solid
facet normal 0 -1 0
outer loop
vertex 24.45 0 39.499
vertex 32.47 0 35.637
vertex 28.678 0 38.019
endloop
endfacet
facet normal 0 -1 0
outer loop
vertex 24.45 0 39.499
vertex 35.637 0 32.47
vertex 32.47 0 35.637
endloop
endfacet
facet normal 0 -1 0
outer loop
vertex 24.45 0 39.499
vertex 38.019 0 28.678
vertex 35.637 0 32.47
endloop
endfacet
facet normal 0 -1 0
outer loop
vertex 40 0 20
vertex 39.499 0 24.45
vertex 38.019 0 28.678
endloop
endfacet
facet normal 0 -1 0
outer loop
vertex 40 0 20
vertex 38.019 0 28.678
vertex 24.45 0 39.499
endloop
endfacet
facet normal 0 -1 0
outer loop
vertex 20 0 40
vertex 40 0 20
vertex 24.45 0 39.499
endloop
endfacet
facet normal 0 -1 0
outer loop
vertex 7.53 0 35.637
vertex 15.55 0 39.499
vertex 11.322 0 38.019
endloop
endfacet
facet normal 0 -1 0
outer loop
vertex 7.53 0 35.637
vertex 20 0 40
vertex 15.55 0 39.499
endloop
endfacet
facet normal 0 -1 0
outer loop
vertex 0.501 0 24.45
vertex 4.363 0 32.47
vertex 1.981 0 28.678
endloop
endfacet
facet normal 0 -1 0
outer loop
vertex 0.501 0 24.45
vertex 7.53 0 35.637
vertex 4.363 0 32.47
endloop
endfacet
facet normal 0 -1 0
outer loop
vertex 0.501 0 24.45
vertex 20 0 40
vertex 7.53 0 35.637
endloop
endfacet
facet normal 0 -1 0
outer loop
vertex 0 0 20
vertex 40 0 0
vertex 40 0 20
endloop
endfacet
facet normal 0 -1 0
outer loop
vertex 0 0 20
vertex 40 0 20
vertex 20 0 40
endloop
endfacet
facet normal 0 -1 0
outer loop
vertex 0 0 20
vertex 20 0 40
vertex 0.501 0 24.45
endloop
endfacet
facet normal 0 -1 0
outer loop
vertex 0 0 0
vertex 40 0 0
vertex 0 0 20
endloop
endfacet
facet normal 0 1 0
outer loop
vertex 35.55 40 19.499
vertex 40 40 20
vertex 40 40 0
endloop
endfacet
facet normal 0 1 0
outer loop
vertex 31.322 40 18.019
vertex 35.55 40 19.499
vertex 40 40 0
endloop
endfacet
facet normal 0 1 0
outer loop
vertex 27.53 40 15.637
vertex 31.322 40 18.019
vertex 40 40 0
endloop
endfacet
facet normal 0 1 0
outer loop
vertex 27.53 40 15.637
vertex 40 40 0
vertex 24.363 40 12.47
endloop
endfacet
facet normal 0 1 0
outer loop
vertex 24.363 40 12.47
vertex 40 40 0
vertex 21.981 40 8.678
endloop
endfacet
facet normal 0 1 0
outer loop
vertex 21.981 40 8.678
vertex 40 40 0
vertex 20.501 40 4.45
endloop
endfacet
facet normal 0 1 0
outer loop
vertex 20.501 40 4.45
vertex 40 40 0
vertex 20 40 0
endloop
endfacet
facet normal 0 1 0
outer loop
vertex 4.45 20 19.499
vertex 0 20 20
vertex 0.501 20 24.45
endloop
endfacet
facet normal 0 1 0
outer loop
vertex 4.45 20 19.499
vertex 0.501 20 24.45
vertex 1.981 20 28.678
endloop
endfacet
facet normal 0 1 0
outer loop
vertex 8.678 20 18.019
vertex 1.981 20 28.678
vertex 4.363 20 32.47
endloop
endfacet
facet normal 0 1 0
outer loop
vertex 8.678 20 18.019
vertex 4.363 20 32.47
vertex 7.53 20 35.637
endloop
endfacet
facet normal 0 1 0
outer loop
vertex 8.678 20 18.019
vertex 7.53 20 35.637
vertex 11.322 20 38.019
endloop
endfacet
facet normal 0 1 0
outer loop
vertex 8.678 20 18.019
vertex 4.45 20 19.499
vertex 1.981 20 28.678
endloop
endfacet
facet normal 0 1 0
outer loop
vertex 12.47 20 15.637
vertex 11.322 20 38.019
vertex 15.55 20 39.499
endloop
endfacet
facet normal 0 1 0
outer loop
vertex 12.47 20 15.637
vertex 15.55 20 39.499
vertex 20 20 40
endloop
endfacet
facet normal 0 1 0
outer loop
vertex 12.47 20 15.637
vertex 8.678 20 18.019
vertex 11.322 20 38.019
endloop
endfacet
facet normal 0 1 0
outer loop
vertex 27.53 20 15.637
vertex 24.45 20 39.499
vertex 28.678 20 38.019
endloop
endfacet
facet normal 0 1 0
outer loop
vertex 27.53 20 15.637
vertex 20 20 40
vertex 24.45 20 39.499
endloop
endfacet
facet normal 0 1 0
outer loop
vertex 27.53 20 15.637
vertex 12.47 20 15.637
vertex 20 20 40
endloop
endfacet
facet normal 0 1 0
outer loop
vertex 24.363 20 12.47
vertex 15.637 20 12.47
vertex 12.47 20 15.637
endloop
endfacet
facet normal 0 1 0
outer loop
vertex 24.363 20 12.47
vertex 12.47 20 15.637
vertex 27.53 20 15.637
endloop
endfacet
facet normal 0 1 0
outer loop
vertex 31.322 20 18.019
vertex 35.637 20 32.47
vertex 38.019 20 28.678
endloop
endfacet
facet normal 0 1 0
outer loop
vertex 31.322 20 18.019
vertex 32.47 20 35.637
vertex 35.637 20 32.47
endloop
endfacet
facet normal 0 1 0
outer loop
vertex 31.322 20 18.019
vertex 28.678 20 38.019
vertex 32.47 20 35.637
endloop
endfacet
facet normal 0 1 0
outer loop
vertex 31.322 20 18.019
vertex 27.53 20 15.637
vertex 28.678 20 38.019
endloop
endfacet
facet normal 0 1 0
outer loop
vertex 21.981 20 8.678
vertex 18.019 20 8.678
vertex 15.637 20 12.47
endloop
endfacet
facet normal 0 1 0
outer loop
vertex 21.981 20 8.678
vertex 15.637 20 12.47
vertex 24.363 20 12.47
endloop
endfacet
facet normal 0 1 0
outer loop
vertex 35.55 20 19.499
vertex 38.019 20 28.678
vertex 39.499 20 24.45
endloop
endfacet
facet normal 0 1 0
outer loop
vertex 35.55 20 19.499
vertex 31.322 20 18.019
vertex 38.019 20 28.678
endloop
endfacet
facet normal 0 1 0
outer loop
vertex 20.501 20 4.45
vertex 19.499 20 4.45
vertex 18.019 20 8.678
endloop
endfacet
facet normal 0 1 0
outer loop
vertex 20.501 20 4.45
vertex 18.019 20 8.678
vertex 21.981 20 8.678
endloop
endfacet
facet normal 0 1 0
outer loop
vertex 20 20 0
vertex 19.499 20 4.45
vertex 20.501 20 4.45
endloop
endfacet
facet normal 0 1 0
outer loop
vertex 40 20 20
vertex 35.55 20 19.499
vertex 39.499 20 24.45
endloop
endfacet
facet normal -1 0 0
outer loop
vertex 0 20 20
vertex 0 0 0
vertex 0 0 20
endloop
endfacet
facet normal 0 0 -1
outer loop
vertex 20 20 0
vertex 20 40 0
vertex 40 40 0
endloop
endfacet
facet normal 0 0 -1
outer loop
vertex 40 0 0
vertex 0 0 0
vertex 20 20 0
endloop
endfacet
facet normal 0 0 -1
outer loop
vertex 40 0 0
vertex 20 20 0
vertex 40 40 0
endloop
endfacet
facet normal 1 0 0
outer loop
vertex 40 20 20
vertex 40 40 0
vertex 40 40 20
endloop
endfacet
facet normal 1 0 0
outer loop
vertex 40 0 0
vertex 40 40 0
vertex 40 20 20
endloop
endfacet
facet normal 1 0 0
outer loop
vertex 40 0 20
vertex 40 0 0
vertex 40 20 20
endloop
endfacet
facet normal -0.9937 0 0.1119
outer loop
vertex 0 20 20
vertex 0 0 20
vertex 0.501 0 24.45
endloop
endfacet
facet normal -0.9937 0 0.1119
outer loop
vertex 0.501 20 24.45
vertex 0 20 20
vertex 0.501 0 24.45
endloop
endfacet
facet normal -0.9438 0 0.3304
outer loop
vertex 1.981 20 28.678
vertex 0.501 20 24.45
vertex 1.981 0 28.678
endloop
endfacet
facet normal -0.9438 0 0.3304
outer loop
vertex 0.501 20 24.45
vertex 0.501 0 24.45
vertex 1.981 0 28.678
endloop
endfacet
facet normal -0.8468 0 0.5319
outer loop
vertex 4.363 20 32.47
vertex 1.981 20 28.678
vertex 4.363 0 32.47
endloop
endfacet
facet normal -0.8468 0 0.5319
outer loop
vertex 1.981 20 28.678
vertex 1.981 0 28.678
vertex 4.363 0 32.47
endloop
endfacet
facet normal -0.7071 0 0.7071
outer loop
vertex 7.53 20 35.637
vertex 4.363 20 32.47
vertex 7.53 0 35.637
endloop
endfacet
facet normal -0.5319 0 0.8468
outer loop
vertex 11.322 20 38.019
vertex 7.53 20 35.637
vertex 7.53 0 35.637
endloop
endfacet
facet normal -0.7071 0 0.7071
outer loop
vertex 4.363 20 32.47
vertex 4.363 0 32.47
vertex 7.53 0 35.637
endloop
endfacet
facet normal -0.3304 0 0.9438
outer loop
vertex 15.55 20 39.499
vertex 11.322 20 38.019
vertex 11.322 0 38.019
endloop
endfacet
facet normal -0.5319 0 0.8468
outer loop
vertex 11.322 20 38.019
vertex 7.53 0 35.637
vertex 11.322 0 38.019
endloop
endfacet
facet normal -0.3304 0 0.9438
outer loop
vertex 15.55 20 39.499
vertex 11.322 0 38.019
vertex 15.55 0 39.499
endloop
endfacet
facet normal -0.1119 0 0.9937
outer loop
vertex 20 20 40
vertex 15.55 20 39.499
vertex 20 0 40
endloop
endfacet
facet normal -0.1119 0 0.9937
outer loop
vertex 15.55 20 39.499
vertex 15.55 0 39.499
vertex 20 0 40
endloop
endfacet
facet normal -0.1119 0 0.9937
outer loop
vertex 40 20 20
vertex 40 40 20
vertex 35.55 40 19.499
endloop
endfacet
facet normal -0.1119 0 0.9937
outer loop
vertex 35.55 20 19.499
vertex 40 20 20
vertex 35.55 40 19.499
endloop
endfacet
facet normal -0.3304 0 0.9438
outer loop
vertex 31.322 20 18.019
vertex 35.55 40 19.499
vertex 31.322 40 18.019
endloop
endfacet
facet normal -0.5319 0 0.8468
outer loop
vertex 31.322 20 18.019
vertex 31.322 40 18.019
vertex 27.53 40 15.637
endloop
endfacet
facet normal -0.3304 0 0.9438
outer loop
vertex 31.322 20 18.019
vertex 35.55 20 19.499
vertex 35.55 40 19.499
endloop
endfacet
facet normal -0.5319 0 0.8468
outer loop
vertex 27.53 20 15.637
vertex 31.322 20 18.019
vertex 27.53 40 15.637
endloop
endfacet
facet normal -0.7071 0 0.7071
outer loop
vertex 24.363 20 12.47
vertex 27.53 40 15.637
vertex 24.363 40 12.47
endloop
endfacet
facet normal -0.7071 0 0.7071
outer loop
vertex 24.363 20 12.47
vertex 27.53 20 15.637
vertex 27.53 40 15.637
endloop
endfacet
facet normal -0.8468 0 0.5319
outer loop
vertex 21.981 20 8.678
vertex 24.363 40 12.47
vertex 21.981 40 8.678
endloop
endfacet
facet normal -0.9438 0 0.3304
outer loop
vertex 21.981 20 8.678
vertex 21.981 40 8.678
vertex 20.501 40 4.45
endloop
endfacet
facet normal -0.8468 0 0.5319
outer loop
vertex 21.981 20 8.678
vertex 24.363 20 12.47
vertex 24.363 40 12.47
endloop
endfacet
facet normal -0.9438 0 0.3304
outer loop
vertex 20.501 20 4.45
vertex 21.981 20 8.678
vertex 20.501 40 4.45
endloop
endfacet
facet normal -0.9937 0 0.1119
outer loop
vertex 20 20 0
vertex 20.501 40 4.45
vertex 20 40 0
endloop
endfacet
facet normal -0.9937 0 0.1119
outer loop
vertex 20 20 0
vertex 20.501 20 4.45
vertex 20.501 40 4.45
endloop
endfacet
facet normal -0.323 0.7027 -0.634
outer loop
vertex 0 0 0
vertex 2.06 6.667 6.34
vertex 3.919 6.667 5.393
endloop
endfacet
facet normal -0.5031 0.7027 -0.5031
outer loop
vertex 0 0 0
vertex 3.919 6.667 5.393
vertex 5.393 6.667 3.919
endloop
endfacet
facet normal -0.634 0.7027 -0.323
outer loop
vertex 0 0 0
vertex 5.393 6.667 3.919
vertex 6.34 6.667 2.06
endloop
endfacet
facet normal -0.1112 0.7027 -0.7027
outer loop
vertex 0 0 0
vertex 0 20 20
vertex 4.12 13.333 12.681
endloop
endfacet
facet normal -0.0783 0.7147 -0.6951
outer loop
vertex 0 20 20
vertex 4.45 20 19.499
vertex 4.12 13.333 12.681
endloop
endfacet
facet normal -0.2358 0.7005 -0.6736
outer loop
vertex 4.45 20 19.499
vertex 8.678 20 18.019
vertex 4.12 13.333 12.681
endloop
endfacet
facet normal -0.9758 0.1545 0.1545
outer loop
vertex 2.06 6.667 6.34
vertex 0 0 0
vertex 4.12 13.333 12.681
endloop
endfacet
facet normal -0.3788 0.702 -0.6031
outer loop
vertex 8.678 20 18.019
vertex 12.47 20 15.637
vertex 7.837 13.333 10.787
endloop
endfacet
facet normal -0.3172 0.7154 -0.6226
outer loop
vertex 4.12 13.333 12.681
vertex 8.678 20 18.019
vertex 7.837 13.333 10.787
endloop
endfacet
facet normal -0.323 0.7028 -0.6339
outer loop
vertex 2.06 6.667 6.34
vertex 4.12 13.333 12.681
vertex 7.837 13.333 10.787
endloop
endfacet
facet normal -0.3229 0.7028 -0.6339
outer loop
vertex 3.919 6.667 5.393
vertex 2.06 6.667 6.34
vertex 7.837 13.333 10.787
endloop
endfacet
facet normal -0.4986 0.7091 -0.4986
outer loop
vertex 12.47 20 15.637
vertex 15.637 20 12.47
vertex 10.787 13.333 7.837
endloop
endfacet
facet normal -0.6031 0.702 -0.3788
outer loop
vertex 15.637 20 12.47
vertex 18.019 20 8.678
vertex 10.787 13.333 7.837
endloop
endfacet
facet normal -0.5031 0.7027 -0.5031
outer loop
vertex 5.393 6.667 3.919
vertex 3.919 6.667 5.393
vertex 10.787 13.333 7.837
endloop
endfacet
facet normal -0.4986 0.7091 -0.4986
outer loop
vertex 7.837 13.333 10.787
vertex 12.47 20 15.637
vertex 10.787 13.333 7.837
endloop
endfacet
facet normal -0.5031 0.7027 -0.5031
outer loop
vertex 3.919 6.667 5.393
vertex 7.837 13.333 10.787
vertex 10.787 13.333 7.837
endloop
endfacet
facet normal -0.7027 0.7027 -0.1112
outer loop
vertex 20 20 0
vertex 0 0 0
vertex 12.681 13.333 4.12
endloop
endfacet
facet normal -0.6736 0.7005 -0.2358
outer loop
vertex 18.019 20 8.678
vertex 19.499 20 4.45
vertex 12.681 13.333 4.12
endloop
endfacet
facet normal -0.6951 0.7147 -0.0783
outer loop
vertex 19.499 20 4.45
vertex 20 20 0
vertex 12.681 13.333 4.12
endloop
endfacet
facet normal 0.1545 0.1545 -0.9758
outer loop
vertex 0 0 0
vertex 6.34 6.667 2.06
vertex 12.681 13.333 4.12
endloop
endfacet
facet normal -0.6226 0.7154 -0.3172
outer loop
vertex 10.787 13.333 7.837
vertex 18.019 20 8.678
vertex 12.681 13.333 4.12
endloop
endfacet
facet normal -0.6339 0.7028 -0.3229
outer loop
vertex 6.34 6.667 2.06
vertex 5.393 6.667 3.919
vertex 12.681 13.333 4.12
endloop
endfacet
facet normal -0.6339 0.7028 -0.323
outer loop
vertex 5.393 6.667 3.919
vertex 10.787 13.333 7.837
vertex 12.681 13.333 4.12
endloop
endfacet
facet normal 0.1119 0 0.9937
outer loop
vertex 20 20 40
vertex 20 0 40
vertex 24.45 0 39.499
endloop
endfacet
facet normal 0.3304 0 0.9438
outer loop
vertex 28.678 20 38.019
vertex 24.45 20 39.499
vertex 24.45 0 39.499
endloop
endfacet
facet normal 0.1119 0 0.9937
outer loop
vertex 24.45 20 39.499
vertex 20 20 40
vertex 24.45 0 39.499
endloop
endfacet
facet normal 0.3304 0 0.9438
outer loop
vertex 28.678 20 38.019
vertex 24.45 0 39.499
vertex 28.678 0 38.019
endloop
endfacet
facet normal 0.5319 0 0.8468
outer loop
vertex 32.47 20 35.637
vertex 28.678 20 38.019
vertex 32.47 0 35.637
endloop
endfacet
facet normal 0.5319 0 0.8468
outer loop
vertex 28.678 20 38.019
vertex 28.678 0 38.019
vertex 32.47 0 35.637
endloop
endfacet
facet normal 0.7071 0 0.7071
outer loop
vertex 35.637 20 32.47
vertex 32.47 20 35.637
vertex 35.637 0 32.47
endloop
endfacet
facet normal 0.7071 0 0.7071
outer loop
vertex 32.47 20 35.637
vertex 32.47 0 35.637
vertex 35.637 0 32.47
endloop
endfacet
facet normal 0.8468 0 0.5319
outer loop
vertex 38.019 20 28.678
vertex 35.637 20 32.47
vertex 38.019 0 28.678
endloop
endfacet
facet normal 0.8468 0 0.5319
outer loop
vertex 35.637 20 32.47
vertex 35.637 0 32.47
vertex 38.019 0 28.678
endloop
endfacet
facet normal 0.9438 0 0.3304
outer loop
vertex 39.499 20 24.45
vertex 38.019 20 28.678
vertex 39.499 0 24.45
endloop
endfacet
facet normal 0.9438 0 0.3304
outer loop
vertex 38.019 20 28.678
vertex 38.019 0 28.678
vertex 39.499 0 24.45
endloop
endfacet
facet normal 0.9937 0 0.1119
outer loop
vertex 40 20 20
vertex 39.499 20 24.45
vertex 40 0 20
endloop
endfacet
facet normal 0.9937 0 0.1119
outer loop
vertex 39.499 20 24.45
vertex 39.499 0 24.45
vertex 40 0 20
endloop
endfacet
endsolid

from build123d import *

# Parameters (mm, degrees)
BOSS_EXTRUDE1_DEPTH = 40
CUT_EXTRUDE1_DEPTH  = 40
SKETCH3_W           = 20
SKETCH3_H           = 20
CUT_EXTRUDE2_DEPTH  = 20
BOSS_EXTRUDE4_DEPTH = 20
CUT_EXTRUDE3_DEPTH  = 20


with BuildPart() as part:
    # Sketch1 → Boss-Extrude1 (new body)
    with BuildSketch(Plane.XY):
        Polygon((0, 0), (0, 40), (20, 40), (20, 20), (40, 20), (40, 0), align=None)
    extrude(amount=BOSS_EXTRUDE1_DEPTH)

    # Sketch2 → Cut-Extrude1 (cut)
    with BuildSketch(Plane(origin=(0, 0, 0), x_dir=(-1, 0, 0), z_dir=(0, -1, 0))):
        with BuildLine():
            Line((0, -40), (0, -20))
            ThreePointArc((0, -20), (-5.857864376, -34.142135624), (-20, -40))
            Line((-20, -40), (0, -40))
        make_face()
        with BuildLine():
            Line((-40, -40), (-20, -40))
            ThreePointArc((-20, -40), (-34.142135624, -34.142135624), (-40, -20))
            Line((-40, -20), (-40, -40))
        make_face()
    extrude(amount=-CUT_EXTRUDE1_DEPTH, mode=Mode.SUBTRACT)

    # Sketch3 → Cut-Extrude2 (cut)
    with BuildSketch(Plane(origin=(0, 20, 0), x_dir=(1, 0, 0), z_dir=(0, 1, 0))):
        with Locations((10, -10)):
            Rectangle(SKETCH3_W, SKETCH3_H)
    extrude(amount=CUT_EXTRUDE2_DEPTH, mode=Mode.SUBTRACT)

    # Sketch4 → Boss-Extrude4 (add)
    with BuildSketch(Plane(origin=(0, 20, 0), x_dir=(1, 0, 0), z_dir=(0, 1, 0))):
        with BuildLine():
            Line((20, 0), (40, 0))
            Line((40, 0), (40, -20))
            ThreePointArc((40, -20), (25.857864376, -14.142135624), (20, 0))
        make_face()
    extrude(amount=BOSS_EXTRUDE4_DEPTH)

    # Sketch5 → Cut-Extrude3 (cut)
    with BuildSketch(Plane(origin=(0, 40, 0), x_dir=(1, 0, 0), z_dir=(0, 1, 0))):
        with BuildLine():
            ThreePointArc((0, -20), (5.857864376, -34.142135624), (20, -40))
            Line((20, -40), (20, -20))
            Line((20, -20), (0, -20))
        make_face()
    extrude(amount=-CUT_EXTRUDE3_DEPTH, mode=Mode.SUBTRACT)

    # Sketch6 → Cut-Revolve1 (revolve, cut)
    with BuildSketch(Plane.ZY):
        Polygon((0, 0), (20, 20), (0, 20), align=None)
    revolve(axis=Axis((0, 0, 0), (0, 1, 0)), mode=Mode.SUBTRACT)


solid = part.part
